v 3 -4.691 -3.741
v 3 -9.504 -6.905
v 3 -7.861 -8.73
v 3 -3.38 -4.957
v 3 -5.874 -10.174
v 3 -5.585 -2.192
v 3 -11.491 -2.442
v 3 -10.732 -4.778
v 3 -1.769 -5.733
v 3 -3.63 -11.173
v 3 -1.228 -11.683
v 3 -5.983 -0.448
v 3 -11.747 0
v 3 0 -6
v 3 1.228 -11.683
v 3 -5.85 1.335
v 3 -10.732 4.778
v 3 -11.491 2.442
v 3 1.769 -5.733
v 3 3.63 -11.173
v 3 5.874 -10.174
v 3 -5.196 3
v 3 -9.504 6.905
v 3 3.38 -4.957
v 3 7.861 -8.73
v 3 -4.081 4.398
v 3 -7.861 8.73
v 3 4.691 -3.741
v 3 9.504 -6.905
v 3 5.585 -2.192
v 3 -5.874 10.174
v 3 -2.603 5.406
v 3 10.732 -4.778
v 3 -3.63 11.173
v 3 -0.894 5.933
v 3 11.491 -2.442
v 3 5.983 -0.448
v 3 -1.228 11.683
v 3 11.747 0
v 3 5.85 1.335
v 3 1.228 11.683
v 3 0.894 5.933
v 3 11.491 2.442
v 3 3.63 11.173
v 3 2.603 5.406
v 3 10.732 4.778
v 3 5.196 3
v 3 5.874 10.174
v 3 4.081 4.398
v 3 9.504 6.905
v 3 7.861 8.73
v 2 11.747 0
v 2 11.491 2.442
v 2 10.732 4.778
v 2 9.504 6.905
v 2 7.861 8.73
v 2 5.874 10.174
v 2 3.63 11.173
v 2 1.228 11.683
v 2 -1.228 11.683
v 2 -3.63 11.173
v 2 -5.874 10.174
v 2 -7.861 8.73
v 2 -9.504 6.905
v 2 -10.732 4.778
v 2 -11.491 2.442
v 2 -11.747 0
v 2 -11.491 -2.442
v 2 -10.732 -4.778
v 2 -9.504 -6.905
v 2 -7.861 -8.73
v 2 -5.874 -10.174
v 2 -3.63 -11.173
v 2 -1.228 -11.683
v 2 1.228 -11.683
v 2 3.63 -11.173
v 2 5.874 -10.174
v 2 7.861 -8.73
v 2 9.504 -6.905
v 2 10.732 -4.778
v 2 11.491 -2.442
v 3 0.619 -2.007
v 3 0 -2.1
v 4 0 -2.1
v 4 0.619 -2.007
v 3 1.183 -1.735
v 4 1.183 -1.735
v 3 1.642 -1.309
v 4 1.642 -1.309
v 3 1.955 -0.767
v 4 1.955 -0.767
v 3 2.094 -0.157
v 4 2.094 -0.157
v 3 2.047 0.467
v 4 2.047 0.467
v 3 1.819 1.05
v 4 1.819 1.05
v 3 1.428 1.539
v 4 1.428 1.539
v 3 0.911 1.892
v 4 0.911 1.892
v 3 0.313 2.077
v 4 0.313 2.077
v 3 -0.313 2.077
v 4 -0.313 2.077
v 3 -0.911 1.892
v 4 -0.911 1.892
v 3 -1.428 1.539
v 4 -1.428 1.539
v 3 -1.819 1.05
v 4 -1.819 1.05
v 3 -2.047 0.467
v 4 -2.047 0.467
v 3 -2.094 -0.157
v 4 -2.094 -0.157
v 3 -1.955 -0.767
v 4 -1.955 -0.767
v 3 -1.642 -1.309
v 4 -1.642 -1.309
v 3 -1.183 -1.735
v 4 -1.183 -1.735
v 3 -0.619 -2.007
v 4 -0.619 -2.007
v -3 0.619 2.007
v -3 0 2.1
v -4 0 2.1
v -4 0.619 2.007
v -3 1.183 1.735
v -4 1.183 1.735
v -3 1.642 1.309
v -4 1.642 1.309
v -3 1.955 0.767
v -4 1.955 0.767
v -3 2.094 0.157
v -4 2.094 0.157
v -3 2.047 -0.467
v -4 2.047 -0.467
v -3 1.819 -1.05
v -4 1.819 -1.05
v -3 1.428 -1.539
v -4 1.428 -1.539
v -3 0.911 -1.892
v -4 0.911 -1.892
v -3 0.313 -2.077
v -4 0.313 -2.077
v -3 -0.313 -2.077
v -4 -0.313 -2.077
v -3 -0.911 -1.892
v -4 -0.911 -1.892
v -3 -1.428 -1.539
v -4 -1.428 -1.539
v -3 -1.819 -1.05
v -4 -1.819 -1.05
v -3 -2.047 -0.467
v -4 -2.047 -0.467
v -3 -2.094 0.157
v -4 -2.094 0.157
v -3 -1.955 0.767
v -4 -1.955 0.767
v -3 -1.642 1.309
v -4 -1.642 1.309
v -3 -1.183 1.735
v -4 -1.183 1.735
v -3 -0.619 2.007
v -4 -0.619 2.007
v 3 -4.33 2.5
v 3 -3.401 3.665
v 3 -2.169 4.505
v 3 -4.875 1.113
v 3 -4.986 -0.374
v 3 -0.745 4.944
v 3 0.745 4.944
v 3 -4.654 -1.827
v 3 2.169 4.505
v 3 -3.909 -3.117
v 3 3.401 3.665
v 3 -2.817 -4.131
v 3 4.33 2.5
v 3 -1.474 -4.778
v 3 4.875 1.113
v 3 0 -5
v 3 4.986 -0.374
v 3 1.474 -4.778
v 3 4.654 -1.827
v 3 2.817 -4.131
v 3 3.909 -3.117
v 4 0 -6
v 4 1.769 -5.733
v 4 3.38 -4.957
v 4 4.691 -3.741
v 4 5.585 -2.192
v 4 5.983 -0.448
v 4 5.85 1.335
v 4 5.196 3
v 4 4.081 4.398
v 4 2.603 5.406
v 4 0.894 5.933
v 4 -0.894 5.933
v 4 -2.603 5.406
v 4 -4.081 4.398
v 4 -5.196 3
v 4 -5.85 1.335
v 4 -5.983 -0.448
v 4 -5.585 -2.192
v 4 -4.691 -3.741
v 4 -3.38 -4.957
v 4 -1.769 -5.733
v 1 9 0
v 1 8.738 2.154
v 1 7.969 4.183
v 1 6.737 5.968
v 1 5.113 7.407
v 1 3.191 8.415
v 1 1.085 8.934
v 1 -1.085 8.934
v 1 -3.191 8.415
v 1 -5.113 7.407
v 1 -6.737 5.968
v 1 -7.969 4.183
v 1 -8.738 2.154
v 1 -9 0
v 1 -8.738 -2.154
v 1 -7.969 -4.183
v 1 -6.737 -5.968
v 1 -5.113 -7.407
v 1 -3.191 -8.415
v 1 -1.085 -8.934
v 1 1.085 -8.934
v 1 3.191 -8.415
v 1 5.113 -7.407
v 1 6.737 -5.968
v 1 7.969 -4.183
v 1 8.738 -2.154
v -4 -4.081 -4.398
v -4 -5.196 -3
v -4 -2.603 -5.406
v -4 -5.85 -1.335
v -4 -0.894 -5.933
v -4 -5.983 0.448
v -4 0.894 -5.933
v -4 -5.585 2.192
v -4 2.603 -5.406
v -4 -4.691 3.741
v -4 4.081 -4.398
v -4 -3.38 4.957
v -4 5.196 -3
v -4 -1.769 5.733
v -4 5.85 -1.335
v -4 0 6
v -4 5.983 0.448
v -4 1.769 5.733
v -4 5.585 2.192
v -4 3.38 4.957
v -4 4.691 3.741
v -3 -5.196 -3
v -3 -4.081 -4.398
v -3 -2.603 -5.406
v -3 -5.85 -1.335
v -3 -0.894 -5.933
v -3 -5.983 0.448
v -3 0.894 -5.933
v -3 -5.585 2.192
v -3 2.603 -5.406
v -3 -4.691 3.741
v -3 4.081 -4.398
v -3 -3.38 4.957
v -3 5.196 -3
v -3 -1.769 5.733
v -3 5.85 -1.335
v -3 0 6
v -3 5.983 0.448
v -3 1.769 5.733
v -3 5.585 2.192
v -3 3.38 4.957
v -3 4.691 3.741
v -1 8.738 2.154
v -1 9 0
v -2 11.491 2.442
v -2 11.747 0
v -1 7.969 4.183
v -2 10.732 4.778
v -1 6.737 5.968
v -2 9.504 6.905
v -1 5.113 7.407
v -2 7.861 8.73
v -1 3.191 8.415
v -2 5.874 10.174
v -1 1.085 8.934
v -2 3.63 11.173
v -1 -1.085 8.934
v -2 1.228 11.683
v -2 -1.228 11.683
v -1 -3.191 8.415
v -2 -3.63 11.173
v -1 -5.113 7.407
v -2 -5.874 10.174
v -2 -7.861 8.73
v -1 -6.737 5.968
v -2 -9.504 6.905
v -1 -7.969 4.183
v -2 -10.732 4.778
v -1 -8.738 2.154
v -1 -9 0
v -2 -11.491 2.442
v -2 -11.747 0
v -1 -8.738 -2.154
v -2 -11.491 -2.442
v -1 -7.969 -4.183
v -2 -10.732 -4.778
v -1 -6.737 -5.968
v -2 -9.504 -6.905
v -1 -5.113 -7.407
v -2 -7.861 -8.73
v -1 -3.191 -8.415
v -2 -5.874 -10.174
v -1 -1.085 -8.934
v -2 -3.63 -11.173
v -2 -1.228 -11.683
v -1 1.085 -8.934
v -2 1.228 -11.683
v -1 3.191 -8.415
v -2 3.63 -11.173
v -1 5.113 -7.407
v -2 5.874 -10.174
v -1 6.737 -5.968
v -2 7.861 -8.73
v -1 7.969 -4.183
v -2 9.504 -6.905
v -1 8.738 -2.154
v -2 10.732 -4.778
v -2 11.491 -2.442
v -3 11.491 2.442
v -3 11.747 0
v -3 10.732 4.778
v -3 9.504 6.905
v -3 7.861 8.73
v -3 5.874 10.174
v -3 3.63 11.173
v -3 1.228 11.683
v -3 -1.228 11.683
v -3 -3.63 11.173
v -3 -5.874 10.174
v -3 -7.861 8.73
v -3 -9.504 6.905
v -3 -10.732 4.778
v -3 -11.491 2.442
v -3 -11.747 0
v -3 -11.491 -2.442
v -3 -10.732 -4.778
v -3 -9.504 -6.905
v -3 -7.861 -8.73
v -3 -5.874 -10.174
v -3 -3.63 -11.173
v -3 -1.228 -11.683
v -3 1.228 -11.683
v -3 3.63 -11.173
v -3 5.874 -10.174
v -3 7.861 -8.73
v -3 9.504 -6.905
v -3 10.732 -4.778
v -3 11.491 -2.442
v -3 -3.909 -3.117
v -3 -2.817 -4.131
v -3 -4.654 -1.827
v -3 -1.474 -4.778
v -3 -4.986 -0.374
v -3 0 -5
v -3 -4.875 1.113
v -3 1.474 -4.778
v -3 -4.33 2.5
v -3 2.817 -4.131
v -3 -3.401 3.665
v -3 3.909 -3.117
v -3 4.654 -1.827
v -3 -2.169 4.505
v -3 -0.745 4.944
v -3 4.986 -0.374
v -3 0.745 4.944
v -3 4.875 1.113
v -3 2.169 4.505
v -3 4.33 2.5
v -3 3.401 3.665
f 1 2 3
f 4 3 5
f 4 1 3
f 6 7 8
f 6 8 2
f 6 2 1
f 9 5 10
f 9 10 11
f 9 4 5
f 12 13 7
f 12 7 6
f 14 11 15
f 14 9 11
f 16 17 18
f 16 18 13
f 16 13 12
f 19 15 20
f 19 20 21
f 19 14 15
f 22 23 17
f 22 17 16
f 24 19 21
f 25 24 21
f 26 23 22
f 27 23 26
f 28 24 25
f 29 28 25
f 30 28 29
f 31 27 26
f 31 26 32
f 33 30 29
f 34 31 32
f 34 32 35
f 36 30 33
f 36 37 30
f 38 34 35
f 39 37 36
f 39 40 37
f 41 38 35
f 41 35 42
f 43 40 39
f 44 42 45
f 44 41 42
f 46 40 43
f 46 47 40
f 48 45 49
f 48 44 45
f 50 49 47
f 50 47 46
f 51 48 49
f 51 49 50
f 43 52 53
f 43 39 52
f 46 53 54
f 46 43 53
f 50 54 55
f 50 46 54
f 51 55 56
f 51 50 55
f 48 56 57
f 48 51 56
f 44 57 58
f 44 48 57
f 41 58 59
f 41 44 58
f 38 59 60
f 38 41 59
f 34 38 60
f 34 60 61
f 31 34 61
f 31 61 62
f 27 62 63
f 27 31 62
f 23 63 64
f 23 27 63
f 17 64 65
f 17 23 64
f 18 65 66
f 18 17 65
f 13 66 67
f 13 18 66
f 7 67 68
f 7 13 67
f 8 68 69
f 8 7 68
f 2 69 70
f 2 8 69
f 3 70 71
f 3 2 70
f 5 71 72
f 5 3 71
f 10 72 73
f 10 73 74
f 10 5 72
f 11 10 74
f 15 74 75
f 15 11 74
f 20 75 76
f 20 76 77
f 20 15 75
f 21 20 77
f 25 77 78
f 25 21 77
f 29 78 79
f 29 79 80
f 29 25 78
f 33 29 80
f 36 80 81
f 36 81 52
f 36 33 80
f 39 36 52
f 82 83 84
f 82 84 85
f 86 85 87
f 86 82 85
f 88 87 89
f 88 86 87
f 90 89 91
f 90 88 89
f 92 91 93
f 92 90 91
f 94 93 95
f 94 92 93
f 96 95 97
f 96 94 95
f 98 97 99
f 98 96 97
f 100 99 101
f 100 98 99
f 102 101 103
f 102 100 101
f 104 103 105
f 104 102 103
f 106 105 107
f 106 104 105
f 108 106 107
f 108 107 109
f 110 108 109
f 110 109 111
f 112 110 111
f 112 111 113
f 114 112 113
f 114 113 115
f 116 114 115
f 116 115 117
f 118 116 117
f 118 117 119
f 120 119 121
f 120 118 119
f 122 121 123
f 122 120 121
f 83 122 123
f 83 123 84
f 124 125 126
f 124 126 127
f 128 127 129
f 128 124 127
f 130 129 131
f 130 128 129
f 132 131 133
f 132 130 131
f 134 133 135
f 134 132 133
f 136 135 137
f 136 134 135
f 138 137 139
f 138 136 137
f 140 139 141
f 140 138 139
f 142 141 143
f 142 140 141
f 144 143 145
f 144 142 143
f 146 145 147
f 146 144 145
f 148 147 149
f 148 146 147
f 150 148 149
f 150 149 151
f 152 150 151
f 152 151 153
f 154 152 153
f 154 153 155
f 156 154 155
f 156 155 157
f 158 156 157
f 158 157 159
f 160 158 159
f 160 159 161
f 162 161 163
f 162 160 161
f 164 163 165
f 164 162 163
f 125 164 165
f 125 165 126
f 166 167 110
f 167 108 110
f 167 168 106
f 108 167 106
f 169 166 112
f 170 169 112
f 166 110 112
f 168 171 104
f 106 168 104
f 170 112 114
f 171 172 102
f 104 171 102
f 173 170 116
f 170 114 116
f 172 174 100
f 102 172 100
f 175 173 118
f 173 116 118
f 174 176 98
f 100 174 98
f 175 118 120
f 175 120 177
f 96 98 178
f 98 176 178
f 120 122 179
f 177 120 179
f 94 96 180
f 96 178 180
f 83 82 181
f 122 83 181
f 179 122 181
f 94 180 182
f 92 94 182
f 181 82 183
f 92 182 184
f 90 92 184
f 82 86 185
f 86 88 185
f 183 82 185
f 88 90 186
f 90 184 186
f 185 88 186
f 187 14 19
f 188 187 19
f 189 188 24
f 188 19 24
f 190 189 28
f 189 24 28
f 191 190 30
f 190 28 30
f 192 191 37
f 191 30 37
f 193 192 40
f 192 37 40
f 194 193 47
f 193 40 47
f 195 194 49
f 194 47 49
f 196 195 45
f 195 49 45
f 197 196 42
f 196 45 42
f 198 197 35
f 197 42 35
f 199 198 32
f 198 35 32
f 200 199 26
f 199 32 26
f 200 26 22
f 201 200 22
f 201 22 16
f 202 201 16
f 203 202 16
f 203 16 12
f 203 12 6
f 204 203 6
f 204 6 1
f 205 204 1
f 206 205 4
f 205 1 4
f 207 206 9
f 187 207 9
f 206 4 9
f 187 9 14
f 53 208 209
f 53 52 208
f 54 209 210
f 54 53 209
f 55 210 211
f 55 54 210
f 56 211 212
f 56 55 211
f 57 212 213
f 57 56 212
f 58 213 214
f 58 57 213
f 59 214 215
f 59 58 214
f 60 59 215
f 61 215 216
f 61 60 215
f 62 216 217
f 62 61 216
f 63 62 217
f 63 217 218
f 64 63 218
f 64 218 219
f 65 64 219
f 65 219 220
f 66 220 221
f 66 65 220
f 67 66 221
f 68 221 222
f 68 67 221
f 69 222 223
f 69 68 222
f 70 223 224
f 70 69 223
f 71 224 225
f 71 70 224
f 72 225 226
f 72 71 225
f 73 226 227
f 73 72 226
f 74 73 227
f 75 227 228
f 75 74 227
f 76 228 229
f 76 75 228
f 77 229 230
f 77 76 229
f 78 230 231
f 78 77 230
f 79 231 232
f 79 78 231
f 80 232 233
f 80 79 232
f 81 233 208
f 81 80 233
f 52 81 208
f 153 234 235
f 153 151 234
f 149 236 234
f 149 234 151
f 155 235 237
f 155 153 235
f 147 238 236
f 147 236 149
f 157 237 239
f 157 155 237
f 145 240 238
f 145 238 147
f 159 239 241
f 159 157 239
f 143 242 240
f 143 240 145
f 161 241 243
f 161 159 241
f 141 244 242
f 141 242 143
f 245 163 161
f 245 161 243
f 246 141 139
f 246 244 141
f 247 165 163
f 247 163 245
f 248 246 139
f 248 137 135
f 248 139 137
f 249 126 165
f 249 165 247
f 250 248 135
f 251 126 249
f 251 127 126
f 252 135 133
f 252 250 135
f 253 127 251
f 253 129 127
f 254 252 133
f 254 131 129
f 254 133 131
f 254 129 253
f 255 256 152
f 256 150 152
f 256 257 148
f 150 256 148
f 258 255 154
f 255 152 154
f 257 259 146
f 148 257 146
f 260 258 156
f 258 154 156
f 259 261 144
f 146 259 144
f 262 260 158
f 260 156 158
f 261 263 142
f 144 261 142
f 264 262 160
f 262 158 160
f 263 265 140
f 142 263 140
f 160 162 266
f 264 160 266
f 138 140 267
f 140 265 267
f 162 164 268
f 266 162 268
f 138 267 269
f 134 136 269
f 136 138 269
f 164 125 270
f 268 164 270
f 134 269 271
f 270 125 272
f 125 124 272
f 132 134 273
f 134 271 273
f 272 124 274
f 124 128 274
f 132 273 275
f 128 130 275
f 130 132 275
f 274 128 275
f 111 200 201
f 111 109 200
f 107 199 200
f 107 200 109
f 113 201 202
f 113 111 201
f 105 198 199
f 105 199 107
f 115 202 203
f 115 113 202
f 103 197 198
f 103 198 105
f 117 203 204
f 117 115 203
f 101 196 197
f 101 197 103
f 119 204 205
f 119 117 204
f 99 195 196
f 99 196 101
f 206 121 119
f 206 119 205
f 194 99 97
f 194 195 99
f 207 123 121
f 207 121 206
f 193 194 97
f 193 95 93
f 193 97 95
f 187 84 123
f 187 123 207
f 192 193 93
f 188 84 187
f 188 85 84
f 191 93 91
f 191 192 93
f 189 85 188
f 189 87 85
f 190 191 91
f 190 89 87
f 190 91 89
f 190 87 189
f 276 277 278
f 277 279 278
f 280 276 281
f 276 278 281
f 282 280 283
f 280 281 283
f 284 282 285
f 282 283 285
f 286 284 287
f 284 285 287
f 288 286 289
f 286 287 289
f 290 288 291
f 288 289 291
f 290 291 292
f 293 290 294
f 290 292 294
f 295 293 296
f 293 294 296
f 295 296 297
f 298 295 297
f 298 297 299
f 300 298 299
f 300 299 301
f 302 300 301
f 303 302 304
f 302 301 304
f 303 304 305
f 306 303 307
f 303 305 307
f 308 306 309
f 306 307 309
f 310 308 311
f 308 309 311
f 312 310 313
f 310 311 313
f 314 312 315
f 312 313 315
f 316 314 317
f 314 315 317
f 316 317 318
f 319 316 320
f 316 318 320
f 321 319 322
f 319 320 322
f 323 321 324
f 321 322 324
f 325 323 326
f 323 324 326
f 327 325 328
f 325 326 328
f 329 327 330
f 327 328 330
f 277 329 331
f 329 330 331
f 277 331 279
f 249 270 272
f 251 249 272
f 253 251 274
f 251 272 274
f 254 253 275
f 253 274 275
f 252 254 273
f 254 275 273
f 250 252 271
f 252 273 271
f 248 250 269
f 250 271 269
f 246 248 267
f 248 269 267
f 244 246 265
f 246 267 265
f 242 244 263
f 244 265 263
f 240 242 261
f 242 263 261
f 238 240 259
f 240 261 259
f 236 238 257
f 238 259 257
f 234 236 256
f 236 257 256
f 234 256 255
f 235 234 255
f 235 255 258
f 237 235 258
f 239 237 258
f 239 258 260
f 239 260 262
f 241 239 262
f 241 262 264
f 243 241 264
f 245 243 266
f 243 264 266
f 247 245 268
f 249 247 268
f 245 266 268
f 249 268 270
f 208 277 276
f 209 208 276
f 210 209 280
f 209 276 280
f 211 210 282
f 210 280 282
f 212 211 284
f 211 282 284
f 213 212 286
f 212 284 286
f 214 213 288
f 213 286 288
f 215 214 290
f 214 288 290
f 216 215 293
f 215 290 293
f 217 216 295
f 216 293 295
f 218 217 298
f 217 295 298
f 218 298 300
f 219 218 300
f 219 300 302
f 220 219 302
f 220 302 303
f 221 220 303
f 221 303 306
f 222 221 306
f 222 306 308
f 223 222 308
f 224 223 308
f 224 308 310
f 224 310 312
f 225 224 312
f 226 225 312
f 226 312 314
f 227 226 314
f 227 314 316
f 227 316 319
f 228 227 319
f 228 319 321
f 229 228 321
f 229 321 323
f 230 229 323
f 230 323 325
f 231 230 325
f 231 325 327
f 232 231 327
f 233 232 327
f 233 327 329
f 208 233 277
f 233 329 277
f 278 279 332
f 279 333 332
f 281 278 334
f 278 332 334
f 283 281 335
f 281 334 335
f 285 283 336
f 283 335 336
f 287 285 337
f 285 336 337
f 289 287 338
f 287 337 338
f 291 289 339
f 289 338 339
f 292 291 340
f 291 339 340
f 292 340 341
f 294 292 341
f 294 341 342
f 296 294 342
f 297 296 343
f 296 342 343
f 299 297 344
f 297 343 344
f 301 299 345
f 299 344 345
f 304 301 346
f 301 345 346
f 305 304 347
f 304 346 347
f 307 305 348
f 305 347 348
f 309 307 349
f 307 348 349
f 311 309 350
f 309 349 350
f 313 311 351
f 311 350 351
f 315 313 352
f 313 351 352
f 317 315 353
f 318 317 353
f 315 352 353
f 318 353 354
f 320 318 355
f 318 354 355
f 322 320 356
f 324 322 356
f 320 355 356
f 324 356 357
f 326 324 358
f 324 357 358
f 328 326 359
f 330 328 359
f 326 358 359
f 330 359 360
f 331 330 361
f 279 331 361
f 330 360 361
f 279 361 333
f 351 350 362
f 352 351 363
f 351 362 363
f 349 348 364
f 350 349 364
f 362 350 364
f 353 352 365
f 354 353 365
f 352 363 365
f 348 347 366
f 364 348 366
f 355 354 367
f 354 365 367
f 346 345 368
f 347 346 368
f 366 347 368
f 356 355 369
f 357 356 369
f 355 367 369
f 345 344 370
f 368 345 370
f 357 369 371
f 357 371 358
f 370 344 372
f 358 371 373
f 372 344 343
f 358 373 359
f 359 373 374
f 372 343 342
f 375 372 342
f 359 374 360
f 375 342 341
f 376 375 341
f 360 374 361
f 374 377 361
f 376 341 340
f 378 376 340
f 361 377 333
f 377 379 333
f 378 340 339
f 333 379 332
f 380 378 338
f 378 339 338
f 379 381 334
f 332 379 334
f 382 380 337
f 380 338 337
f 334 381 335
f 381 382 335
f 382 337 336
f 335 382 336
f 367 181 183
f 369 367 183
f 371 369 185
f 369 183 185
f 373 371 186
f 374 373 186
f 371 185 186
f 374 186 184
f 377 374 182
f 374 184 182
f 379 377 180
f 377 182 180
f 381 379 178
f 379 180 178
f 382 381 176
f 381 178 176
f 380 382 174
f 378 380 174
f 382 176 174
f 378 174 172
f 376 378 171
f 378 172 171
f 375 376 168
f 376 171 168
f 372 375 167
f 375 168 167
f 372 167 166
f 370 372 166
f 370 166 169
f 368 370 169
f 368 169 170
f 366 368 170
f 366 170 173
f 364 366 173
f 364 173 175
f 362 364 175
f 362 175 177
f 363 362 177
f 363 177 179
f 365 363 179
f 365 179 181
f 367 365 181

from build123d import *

# Parameters (mm, degrees)
SKETCH3_R           = 5
CUT_EXTRUDE1_DEPTH  = 87
SKETCH5_R           = 6
SKETCH5_R_2         = 2.1
BOSS_EXTRUDE2_DEPTH = 1
SKETCH7_R           = 6
SKETCH7_R_2         = 2.1
BOSS_EXTRUDE3_DEPTH = 1


with BuildPart() as part:
    # Sketch1 → Revolve1 (revolve)
    with BuildSketch(Plane.XY):
        Polygon((0, 0), (0, 9), (1, 9), (2, 11.747477419), (3, 11.747477419), (3, 0), align=None)
    revolve1 = revolve(axis=Axis((0, 0, 0), (1, 0, 0)))

    # Mirror1: Revolve1 across plane
    add(revolve1.mirror(Plane(origin=(0, 0, 0), x_dir=(0, 0, 1), z_dir=(1, 0, 0))))

    # Sketch3 → Cut-Extrude1 (cut)
    with BuildSketch(Plane(origin=(3, 0, 0), x_dir=(0, 0, -1), z_dir=(1, 0, 0))):
        Circle(SKETCH3_R)
    extrude(amount=-CUT_EXTRUDE1_DEPTH, mode=Mode.SUBTRACT)

    # Sketch5 → Boss-Extrude2 (add)
    with BuildSketch(Plane(origin=(3, 0, 0), x_dir=(0, 0, -1), z_dir=(1, 0, 0))):
        Circle(SKETCH5_R)
        Circle(SKETCH5_R_2, mode=Mode.SUBTRACT)
    extrude(amount=BOSS_EXTRUDE2_DEPTH)


with BuildPart() as body_2:
    # Sketch7 → Boss-Extrude3 (new body)
    with BuildSketch(Plane.ZY.offset(3)):
        Circle(SKETCH7_R)
        Circle(SKETCH7_R_2, mode=Mode.SUBTRACT)
    extrude(amount=BOSS_EXTRUDE3_DEPTH)


solid = Compound([part.part, body_2.part])
